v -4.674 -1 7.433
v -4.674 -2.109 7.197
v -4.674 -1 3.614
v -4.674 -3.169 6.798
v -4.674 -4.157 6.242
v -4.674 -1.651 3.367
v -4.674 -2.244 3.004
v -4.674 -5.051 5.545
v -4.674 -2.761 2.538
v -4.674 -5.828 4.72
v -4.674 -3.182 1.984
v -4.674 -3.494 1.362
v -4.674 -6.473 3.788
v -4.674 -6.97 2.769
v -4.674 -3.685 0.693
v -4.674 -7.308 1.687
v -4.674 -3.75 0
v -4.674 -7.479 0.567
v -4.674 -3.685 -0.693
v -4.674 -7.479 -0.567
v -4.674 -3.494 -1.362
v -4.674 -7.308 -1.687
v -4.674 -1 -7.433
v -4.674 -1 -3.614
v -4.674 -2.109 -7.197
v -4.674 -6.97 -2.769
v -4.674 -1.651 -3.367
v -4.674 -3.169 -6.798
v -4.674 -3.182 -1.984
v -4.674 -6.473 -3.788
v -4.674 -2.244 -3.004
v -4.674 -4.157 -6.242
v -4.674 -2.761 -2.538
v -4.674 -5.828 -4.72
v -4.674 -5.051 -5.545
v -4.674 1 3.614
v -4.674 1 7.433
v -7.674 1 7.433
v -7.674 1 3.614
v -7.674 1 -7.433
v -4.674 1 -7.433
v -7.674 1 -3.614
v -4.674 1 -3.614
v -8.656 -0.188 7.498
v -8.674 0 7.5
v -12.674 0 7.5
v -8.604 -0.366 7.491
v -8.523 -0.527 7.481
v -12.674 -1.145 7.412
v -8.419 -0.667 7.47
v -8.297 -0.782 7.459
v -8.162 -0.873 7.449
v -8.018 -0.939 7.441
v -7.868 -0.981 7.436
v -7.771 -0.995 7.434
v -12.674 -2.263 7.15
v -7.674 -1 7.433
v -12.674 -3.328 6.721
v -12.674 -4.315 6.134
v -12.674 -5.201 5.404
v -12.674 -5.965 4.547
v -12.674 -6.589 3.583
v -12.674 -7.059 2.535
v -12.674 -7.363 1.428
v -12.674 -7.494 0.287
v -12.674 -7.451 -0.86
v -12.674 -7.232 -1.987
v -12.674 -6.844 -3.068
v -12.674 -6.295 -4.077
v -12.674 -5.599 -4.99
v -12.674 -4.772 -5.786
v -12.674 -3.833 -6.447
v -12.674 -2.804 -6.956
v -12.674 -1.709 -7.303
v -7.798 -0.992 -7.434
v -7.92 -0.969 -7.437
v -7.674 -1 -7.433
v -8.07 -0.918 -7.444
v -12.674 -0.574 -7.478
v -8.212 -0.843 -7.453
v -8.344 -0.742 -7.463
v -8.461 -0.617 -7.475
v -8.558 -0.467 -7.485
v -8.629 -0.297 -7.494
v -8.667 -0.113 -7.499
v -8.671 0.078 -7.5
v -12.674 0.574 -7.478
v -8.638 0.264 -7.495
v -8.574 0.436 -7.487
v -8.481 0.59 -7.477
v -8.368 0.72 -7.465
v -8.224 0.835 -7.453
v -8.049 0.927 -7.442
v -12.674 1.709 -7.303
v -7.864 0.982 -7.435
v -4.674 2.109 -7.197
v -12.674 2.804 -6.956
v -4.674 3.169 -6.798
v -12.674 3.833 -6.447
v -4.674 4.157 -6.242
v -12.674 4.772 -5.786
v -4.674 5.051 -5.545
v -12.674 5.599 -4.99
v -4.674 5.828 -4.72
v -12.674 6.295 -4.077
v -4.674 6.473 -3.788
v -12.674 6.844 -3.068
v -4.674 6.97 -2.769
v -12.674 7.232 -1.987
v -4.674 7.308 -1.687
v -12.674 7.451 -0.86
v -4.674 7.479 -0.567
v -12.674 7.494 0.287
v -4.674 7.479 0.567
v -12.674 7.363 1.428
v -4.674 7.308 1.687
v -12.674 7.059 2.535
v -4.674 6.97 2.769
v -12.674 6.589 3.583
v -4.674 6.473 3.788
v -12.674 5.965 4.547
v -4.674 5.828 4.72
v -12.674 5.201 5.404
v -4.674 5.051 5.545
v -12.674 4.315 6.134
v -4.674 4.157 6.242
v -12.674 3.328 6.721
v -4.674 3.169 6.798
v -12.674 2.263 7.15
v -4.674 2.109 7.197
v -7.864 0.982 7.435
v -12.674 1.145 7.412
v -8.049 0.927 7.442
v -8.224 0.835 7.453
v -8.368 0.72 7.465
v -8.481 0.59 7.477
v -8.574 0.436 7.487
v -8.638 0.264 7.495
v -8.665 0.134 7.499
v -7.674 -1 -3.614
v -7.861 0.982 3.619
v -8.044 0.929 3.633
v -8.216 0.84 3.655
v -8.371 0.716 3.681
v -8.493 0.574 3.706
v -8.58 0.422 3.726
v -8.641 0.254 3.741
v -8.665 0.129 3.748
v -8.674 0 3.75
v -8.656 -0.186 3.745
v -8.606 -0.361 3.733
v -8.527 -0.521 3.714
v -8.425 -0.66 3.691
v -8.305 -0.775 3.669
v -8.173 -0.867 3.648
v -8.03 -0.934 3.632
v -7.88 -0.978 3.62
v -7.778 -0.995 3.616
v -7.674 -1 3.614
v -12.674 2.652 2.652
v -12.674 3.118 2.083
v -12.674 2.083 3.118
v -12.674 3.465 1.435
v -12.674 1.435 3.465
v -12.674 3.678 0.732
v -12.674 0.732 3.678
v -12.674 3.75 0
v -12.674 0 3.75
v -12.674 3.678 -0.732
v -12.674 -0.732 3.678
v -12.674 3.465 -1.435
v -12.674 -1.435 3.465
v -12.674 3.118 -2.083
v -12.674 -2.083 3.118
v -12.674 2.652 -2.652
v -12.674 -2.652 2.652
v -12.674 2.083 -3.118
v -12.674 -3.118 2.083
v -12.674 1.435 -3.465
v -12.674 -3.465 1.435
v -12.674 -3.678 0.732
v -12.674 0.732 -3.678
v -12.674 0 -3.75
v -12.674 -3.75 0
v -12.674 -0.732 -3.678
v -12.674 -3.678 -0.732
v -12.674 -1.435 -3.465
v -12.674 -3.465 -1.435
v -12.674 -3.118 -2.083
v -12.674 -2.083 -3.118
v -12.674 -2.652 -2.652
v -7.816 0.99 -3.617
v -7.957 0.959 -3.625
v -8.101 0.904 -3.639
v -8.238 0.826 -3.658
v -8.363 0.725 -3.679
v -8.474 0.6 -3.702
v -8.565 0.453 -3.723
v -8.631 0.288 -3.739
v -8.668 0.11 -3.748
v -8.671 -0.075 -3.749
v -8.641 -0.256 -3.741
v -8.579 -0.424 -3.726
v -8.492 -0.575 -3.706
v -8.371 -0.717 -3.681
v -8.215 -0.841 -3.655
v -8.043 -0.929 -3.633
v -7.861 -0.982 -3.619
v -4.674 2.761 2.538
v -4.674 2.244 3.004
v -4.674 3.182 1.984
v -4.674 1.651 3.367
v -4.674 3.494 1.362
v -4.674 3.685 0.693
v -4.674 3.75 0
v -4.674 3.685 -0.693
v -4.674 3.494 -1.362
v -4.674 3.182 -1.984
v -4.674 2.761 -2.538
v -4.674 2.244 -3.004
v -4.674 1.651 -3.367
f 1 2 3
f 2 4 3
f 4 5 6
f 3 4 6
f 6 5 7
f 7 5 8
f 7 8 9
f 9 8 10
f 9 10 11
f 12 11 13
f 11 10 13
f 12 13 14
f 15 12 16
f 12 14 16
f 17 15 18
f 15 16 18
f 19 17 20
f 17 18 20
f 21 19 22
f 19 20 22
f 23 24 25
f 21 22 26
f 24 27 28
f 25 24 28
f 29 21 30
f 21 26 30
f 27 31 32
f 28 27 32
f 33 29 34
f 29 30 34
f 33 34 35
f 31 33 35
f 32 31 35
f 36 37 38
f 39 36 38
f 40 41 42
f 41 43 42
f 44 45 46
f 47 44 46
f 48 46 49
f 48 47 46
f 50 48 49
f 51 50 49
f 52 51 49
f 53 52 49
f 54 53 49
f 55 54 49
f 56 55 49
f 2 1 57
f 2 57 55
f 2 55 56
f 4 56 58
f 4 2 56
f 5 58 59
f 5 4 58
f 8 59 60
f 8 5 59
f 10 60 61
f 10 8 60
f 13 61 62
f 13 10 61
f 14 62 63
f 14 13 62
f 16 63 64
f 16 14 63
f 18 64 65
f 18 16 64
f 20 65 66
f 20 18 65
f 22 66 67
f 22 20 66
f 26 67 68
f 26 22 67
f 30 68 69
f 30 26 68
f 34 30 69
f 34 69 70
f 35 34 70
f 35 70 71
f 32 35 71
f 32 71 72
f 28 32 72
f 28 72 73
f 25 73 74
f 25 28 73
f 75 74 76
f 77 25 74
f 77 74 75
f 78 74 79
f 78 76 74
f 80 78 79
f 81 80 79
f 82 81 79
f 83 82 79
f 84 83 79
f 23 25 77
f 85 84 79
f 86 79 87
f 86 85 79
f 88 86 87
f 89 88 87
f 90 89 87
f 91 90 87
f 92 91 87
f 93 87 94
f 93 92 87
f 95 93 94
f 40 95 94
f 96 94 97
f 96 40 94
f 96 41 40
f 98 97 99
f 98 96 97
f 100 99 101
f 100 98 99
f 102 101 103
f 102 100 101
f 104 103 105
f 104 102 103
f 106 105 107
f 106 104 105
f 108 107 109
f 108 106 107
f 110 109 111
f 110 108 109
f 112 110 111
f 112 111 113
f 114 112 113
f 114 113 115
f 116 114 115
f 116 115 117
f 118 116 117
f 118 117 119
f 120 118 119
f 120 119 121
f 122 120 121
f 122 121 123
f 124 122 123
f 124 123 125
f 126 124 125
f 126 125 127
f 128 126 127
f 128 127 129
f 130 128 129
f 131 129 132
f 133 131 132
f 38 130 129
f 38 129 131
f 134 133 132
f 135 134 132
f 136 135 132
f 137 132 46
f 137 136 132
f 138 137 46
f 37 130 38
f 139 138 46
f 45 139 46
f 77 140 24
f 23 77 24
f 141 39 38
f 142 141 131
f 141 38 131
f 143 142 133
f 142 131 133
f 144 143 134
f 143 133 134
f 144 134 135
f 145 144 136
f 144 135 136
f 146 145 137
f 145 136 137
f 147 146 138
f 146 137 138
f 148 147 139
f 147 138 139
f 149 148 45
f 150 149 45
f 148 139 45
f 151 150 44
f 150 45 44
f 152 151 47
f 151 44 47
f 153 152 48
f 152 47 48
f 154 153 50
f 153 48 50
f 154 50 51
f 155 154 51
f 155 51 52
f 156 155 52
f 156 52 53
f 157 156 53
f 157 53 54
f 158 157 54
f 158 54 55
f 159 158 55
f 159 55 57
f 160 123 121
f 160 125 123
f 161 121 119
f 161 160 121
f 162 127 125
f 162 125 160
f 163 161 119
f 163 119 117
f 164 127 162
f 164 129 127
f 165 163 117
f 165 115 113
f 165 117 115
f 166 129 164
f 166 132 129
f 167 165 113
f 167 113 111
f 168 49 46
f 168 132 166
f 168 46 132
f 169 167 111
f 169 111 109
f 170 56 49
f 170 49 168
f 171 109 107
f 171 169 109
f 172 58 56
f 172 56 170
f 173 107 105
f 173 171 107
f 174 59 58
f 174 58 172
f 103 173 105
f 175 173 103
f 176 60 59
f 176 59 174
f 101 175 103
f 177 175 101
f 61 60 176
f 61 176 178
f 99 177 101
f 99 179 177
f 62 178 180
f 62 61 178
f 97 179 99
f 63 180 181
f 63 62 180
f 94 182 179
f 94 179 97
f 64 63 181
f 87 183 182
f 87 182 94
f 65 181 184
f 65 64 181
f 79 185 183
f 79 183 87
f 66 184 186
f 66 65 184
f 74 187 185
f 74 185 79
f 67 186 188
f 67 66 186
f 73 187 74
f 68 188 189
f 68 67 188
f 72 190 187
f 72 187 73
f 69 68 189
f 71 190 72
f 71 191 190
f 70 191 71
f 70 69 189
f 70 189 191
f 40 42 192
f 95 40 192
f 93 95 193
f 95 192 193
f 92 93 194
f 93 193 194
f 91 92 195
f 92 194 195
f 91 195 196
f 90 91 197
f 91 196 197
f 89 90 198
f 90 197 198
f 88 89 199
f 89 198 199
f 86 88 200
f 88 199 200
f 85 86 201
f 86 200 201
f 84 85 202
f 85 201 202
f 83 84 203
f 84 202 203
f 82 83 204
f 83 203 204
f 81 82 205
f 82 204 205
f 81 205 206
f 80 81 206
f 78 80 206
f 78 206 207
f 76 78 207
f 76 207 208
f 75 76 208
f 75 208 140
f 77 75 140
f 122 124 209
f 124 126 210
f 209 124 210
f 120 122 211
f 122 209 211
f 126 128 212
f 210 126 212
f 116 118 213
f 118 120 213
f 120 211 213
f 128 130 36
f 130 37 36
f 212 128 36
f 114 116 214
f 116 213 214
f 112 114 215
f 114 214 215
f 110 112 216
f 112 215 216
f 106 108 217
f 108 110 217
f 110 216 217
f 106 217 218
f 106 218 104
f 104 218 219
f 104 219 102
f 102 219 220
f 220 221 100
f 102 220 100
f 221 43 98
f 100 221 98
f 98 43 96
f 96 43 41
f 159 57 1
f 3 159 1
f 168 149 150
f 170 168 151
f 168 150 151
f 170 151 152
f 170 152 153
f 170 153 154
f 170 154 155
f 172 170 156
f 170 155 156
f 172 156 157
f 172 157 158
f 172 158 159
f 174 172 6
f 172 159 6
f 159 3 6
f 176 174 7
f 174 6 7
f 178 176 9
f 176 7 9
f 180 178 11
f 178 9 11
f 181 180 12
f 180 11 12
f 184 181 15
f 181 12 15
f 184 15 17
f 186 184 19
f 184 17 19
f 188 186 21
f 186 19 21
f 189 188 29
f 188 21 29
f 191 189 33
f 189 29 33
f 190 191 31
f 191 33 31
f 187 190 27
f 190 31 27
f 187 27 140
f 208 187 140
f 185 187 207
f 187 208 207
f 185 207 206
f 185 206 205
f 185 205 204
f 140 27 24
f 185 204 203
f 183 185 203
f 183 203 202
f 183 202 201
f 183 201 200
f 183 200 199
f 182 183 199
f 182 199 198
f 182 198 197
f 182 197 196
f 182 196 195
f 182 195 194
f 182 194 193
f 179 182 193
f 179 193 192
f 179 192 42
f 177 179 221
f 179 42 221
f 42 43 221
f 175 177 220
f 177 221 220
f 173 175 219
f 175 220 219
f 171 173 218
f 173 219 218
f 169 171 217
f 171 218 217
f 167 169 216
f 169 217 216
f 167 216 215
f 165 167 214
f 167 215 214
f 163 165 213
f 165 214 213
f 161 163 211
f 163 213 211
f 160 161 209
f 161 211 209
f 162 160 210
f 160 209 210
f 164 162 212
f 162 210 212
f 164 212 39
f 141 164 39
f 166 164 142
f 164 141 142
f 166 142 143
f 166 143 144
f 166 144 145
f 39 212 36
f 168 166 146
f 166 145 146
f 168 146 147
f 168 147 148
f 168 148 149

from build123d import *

# Parameters (mm, degrees)
ESQUISSE1_W             = 8
ESQUISSE1_H             = 3.75
ENL_V_MAT_EXTRU_2_DEPTH = 25


with BuildPart() as part:
    # Esquisse1 → R_volution1 (revolve)
    with BuildSketch(Plane.XY, mode=Mode.PRIVATE) as r_volution1_sk:
        with Locations((-8.673814, 5.625)):
            Rectangle(ESQUISSE1_W, ESQUISSE1_H)
    revolve(r_volution1_sk.sketch.rotate(Axis((-26.499793814, 0, 0), (1, 0, 0)), 90), axis=Axis((-26.499793814, 0, 0), (1, 0, 0)))  # turned: the seam where the file's is

    # Esquisse2 → Enl_v. mat.-Extru.2 (cut, symmetric)
    with BuildSketch(Plane.XY):
        with BuildLine():
            Line((-8.673814, 0), (-4.141062675, 0))
            Line((-4.141062675, 0), (-4.145756794, 1))
            Line((-4.145756794, 1), (-7.673814, 1))
            ThreePointArc((-7.673814, 1), (-8.380920781, 0.707106781), (-8.673814, 0))
        make_face()
        with BuildLine():
            Line((-7.673814, -1), (-4.136368556, -1))
            Line((-4.136368556, -1), (-4.141062675, 0))
            Line((-4.141062675, 0), (-8.673814, 0))
            ThreePointArc((-8.673814, 0), (-8.380920781, -0.707106781), (-7.673814, -1))
        make_face()
    extrude(amount=ENL_V_MAT_EXTRU_2_DEPTH, both=True, mode=Mode.SUBTRACT)


solid = part.part
